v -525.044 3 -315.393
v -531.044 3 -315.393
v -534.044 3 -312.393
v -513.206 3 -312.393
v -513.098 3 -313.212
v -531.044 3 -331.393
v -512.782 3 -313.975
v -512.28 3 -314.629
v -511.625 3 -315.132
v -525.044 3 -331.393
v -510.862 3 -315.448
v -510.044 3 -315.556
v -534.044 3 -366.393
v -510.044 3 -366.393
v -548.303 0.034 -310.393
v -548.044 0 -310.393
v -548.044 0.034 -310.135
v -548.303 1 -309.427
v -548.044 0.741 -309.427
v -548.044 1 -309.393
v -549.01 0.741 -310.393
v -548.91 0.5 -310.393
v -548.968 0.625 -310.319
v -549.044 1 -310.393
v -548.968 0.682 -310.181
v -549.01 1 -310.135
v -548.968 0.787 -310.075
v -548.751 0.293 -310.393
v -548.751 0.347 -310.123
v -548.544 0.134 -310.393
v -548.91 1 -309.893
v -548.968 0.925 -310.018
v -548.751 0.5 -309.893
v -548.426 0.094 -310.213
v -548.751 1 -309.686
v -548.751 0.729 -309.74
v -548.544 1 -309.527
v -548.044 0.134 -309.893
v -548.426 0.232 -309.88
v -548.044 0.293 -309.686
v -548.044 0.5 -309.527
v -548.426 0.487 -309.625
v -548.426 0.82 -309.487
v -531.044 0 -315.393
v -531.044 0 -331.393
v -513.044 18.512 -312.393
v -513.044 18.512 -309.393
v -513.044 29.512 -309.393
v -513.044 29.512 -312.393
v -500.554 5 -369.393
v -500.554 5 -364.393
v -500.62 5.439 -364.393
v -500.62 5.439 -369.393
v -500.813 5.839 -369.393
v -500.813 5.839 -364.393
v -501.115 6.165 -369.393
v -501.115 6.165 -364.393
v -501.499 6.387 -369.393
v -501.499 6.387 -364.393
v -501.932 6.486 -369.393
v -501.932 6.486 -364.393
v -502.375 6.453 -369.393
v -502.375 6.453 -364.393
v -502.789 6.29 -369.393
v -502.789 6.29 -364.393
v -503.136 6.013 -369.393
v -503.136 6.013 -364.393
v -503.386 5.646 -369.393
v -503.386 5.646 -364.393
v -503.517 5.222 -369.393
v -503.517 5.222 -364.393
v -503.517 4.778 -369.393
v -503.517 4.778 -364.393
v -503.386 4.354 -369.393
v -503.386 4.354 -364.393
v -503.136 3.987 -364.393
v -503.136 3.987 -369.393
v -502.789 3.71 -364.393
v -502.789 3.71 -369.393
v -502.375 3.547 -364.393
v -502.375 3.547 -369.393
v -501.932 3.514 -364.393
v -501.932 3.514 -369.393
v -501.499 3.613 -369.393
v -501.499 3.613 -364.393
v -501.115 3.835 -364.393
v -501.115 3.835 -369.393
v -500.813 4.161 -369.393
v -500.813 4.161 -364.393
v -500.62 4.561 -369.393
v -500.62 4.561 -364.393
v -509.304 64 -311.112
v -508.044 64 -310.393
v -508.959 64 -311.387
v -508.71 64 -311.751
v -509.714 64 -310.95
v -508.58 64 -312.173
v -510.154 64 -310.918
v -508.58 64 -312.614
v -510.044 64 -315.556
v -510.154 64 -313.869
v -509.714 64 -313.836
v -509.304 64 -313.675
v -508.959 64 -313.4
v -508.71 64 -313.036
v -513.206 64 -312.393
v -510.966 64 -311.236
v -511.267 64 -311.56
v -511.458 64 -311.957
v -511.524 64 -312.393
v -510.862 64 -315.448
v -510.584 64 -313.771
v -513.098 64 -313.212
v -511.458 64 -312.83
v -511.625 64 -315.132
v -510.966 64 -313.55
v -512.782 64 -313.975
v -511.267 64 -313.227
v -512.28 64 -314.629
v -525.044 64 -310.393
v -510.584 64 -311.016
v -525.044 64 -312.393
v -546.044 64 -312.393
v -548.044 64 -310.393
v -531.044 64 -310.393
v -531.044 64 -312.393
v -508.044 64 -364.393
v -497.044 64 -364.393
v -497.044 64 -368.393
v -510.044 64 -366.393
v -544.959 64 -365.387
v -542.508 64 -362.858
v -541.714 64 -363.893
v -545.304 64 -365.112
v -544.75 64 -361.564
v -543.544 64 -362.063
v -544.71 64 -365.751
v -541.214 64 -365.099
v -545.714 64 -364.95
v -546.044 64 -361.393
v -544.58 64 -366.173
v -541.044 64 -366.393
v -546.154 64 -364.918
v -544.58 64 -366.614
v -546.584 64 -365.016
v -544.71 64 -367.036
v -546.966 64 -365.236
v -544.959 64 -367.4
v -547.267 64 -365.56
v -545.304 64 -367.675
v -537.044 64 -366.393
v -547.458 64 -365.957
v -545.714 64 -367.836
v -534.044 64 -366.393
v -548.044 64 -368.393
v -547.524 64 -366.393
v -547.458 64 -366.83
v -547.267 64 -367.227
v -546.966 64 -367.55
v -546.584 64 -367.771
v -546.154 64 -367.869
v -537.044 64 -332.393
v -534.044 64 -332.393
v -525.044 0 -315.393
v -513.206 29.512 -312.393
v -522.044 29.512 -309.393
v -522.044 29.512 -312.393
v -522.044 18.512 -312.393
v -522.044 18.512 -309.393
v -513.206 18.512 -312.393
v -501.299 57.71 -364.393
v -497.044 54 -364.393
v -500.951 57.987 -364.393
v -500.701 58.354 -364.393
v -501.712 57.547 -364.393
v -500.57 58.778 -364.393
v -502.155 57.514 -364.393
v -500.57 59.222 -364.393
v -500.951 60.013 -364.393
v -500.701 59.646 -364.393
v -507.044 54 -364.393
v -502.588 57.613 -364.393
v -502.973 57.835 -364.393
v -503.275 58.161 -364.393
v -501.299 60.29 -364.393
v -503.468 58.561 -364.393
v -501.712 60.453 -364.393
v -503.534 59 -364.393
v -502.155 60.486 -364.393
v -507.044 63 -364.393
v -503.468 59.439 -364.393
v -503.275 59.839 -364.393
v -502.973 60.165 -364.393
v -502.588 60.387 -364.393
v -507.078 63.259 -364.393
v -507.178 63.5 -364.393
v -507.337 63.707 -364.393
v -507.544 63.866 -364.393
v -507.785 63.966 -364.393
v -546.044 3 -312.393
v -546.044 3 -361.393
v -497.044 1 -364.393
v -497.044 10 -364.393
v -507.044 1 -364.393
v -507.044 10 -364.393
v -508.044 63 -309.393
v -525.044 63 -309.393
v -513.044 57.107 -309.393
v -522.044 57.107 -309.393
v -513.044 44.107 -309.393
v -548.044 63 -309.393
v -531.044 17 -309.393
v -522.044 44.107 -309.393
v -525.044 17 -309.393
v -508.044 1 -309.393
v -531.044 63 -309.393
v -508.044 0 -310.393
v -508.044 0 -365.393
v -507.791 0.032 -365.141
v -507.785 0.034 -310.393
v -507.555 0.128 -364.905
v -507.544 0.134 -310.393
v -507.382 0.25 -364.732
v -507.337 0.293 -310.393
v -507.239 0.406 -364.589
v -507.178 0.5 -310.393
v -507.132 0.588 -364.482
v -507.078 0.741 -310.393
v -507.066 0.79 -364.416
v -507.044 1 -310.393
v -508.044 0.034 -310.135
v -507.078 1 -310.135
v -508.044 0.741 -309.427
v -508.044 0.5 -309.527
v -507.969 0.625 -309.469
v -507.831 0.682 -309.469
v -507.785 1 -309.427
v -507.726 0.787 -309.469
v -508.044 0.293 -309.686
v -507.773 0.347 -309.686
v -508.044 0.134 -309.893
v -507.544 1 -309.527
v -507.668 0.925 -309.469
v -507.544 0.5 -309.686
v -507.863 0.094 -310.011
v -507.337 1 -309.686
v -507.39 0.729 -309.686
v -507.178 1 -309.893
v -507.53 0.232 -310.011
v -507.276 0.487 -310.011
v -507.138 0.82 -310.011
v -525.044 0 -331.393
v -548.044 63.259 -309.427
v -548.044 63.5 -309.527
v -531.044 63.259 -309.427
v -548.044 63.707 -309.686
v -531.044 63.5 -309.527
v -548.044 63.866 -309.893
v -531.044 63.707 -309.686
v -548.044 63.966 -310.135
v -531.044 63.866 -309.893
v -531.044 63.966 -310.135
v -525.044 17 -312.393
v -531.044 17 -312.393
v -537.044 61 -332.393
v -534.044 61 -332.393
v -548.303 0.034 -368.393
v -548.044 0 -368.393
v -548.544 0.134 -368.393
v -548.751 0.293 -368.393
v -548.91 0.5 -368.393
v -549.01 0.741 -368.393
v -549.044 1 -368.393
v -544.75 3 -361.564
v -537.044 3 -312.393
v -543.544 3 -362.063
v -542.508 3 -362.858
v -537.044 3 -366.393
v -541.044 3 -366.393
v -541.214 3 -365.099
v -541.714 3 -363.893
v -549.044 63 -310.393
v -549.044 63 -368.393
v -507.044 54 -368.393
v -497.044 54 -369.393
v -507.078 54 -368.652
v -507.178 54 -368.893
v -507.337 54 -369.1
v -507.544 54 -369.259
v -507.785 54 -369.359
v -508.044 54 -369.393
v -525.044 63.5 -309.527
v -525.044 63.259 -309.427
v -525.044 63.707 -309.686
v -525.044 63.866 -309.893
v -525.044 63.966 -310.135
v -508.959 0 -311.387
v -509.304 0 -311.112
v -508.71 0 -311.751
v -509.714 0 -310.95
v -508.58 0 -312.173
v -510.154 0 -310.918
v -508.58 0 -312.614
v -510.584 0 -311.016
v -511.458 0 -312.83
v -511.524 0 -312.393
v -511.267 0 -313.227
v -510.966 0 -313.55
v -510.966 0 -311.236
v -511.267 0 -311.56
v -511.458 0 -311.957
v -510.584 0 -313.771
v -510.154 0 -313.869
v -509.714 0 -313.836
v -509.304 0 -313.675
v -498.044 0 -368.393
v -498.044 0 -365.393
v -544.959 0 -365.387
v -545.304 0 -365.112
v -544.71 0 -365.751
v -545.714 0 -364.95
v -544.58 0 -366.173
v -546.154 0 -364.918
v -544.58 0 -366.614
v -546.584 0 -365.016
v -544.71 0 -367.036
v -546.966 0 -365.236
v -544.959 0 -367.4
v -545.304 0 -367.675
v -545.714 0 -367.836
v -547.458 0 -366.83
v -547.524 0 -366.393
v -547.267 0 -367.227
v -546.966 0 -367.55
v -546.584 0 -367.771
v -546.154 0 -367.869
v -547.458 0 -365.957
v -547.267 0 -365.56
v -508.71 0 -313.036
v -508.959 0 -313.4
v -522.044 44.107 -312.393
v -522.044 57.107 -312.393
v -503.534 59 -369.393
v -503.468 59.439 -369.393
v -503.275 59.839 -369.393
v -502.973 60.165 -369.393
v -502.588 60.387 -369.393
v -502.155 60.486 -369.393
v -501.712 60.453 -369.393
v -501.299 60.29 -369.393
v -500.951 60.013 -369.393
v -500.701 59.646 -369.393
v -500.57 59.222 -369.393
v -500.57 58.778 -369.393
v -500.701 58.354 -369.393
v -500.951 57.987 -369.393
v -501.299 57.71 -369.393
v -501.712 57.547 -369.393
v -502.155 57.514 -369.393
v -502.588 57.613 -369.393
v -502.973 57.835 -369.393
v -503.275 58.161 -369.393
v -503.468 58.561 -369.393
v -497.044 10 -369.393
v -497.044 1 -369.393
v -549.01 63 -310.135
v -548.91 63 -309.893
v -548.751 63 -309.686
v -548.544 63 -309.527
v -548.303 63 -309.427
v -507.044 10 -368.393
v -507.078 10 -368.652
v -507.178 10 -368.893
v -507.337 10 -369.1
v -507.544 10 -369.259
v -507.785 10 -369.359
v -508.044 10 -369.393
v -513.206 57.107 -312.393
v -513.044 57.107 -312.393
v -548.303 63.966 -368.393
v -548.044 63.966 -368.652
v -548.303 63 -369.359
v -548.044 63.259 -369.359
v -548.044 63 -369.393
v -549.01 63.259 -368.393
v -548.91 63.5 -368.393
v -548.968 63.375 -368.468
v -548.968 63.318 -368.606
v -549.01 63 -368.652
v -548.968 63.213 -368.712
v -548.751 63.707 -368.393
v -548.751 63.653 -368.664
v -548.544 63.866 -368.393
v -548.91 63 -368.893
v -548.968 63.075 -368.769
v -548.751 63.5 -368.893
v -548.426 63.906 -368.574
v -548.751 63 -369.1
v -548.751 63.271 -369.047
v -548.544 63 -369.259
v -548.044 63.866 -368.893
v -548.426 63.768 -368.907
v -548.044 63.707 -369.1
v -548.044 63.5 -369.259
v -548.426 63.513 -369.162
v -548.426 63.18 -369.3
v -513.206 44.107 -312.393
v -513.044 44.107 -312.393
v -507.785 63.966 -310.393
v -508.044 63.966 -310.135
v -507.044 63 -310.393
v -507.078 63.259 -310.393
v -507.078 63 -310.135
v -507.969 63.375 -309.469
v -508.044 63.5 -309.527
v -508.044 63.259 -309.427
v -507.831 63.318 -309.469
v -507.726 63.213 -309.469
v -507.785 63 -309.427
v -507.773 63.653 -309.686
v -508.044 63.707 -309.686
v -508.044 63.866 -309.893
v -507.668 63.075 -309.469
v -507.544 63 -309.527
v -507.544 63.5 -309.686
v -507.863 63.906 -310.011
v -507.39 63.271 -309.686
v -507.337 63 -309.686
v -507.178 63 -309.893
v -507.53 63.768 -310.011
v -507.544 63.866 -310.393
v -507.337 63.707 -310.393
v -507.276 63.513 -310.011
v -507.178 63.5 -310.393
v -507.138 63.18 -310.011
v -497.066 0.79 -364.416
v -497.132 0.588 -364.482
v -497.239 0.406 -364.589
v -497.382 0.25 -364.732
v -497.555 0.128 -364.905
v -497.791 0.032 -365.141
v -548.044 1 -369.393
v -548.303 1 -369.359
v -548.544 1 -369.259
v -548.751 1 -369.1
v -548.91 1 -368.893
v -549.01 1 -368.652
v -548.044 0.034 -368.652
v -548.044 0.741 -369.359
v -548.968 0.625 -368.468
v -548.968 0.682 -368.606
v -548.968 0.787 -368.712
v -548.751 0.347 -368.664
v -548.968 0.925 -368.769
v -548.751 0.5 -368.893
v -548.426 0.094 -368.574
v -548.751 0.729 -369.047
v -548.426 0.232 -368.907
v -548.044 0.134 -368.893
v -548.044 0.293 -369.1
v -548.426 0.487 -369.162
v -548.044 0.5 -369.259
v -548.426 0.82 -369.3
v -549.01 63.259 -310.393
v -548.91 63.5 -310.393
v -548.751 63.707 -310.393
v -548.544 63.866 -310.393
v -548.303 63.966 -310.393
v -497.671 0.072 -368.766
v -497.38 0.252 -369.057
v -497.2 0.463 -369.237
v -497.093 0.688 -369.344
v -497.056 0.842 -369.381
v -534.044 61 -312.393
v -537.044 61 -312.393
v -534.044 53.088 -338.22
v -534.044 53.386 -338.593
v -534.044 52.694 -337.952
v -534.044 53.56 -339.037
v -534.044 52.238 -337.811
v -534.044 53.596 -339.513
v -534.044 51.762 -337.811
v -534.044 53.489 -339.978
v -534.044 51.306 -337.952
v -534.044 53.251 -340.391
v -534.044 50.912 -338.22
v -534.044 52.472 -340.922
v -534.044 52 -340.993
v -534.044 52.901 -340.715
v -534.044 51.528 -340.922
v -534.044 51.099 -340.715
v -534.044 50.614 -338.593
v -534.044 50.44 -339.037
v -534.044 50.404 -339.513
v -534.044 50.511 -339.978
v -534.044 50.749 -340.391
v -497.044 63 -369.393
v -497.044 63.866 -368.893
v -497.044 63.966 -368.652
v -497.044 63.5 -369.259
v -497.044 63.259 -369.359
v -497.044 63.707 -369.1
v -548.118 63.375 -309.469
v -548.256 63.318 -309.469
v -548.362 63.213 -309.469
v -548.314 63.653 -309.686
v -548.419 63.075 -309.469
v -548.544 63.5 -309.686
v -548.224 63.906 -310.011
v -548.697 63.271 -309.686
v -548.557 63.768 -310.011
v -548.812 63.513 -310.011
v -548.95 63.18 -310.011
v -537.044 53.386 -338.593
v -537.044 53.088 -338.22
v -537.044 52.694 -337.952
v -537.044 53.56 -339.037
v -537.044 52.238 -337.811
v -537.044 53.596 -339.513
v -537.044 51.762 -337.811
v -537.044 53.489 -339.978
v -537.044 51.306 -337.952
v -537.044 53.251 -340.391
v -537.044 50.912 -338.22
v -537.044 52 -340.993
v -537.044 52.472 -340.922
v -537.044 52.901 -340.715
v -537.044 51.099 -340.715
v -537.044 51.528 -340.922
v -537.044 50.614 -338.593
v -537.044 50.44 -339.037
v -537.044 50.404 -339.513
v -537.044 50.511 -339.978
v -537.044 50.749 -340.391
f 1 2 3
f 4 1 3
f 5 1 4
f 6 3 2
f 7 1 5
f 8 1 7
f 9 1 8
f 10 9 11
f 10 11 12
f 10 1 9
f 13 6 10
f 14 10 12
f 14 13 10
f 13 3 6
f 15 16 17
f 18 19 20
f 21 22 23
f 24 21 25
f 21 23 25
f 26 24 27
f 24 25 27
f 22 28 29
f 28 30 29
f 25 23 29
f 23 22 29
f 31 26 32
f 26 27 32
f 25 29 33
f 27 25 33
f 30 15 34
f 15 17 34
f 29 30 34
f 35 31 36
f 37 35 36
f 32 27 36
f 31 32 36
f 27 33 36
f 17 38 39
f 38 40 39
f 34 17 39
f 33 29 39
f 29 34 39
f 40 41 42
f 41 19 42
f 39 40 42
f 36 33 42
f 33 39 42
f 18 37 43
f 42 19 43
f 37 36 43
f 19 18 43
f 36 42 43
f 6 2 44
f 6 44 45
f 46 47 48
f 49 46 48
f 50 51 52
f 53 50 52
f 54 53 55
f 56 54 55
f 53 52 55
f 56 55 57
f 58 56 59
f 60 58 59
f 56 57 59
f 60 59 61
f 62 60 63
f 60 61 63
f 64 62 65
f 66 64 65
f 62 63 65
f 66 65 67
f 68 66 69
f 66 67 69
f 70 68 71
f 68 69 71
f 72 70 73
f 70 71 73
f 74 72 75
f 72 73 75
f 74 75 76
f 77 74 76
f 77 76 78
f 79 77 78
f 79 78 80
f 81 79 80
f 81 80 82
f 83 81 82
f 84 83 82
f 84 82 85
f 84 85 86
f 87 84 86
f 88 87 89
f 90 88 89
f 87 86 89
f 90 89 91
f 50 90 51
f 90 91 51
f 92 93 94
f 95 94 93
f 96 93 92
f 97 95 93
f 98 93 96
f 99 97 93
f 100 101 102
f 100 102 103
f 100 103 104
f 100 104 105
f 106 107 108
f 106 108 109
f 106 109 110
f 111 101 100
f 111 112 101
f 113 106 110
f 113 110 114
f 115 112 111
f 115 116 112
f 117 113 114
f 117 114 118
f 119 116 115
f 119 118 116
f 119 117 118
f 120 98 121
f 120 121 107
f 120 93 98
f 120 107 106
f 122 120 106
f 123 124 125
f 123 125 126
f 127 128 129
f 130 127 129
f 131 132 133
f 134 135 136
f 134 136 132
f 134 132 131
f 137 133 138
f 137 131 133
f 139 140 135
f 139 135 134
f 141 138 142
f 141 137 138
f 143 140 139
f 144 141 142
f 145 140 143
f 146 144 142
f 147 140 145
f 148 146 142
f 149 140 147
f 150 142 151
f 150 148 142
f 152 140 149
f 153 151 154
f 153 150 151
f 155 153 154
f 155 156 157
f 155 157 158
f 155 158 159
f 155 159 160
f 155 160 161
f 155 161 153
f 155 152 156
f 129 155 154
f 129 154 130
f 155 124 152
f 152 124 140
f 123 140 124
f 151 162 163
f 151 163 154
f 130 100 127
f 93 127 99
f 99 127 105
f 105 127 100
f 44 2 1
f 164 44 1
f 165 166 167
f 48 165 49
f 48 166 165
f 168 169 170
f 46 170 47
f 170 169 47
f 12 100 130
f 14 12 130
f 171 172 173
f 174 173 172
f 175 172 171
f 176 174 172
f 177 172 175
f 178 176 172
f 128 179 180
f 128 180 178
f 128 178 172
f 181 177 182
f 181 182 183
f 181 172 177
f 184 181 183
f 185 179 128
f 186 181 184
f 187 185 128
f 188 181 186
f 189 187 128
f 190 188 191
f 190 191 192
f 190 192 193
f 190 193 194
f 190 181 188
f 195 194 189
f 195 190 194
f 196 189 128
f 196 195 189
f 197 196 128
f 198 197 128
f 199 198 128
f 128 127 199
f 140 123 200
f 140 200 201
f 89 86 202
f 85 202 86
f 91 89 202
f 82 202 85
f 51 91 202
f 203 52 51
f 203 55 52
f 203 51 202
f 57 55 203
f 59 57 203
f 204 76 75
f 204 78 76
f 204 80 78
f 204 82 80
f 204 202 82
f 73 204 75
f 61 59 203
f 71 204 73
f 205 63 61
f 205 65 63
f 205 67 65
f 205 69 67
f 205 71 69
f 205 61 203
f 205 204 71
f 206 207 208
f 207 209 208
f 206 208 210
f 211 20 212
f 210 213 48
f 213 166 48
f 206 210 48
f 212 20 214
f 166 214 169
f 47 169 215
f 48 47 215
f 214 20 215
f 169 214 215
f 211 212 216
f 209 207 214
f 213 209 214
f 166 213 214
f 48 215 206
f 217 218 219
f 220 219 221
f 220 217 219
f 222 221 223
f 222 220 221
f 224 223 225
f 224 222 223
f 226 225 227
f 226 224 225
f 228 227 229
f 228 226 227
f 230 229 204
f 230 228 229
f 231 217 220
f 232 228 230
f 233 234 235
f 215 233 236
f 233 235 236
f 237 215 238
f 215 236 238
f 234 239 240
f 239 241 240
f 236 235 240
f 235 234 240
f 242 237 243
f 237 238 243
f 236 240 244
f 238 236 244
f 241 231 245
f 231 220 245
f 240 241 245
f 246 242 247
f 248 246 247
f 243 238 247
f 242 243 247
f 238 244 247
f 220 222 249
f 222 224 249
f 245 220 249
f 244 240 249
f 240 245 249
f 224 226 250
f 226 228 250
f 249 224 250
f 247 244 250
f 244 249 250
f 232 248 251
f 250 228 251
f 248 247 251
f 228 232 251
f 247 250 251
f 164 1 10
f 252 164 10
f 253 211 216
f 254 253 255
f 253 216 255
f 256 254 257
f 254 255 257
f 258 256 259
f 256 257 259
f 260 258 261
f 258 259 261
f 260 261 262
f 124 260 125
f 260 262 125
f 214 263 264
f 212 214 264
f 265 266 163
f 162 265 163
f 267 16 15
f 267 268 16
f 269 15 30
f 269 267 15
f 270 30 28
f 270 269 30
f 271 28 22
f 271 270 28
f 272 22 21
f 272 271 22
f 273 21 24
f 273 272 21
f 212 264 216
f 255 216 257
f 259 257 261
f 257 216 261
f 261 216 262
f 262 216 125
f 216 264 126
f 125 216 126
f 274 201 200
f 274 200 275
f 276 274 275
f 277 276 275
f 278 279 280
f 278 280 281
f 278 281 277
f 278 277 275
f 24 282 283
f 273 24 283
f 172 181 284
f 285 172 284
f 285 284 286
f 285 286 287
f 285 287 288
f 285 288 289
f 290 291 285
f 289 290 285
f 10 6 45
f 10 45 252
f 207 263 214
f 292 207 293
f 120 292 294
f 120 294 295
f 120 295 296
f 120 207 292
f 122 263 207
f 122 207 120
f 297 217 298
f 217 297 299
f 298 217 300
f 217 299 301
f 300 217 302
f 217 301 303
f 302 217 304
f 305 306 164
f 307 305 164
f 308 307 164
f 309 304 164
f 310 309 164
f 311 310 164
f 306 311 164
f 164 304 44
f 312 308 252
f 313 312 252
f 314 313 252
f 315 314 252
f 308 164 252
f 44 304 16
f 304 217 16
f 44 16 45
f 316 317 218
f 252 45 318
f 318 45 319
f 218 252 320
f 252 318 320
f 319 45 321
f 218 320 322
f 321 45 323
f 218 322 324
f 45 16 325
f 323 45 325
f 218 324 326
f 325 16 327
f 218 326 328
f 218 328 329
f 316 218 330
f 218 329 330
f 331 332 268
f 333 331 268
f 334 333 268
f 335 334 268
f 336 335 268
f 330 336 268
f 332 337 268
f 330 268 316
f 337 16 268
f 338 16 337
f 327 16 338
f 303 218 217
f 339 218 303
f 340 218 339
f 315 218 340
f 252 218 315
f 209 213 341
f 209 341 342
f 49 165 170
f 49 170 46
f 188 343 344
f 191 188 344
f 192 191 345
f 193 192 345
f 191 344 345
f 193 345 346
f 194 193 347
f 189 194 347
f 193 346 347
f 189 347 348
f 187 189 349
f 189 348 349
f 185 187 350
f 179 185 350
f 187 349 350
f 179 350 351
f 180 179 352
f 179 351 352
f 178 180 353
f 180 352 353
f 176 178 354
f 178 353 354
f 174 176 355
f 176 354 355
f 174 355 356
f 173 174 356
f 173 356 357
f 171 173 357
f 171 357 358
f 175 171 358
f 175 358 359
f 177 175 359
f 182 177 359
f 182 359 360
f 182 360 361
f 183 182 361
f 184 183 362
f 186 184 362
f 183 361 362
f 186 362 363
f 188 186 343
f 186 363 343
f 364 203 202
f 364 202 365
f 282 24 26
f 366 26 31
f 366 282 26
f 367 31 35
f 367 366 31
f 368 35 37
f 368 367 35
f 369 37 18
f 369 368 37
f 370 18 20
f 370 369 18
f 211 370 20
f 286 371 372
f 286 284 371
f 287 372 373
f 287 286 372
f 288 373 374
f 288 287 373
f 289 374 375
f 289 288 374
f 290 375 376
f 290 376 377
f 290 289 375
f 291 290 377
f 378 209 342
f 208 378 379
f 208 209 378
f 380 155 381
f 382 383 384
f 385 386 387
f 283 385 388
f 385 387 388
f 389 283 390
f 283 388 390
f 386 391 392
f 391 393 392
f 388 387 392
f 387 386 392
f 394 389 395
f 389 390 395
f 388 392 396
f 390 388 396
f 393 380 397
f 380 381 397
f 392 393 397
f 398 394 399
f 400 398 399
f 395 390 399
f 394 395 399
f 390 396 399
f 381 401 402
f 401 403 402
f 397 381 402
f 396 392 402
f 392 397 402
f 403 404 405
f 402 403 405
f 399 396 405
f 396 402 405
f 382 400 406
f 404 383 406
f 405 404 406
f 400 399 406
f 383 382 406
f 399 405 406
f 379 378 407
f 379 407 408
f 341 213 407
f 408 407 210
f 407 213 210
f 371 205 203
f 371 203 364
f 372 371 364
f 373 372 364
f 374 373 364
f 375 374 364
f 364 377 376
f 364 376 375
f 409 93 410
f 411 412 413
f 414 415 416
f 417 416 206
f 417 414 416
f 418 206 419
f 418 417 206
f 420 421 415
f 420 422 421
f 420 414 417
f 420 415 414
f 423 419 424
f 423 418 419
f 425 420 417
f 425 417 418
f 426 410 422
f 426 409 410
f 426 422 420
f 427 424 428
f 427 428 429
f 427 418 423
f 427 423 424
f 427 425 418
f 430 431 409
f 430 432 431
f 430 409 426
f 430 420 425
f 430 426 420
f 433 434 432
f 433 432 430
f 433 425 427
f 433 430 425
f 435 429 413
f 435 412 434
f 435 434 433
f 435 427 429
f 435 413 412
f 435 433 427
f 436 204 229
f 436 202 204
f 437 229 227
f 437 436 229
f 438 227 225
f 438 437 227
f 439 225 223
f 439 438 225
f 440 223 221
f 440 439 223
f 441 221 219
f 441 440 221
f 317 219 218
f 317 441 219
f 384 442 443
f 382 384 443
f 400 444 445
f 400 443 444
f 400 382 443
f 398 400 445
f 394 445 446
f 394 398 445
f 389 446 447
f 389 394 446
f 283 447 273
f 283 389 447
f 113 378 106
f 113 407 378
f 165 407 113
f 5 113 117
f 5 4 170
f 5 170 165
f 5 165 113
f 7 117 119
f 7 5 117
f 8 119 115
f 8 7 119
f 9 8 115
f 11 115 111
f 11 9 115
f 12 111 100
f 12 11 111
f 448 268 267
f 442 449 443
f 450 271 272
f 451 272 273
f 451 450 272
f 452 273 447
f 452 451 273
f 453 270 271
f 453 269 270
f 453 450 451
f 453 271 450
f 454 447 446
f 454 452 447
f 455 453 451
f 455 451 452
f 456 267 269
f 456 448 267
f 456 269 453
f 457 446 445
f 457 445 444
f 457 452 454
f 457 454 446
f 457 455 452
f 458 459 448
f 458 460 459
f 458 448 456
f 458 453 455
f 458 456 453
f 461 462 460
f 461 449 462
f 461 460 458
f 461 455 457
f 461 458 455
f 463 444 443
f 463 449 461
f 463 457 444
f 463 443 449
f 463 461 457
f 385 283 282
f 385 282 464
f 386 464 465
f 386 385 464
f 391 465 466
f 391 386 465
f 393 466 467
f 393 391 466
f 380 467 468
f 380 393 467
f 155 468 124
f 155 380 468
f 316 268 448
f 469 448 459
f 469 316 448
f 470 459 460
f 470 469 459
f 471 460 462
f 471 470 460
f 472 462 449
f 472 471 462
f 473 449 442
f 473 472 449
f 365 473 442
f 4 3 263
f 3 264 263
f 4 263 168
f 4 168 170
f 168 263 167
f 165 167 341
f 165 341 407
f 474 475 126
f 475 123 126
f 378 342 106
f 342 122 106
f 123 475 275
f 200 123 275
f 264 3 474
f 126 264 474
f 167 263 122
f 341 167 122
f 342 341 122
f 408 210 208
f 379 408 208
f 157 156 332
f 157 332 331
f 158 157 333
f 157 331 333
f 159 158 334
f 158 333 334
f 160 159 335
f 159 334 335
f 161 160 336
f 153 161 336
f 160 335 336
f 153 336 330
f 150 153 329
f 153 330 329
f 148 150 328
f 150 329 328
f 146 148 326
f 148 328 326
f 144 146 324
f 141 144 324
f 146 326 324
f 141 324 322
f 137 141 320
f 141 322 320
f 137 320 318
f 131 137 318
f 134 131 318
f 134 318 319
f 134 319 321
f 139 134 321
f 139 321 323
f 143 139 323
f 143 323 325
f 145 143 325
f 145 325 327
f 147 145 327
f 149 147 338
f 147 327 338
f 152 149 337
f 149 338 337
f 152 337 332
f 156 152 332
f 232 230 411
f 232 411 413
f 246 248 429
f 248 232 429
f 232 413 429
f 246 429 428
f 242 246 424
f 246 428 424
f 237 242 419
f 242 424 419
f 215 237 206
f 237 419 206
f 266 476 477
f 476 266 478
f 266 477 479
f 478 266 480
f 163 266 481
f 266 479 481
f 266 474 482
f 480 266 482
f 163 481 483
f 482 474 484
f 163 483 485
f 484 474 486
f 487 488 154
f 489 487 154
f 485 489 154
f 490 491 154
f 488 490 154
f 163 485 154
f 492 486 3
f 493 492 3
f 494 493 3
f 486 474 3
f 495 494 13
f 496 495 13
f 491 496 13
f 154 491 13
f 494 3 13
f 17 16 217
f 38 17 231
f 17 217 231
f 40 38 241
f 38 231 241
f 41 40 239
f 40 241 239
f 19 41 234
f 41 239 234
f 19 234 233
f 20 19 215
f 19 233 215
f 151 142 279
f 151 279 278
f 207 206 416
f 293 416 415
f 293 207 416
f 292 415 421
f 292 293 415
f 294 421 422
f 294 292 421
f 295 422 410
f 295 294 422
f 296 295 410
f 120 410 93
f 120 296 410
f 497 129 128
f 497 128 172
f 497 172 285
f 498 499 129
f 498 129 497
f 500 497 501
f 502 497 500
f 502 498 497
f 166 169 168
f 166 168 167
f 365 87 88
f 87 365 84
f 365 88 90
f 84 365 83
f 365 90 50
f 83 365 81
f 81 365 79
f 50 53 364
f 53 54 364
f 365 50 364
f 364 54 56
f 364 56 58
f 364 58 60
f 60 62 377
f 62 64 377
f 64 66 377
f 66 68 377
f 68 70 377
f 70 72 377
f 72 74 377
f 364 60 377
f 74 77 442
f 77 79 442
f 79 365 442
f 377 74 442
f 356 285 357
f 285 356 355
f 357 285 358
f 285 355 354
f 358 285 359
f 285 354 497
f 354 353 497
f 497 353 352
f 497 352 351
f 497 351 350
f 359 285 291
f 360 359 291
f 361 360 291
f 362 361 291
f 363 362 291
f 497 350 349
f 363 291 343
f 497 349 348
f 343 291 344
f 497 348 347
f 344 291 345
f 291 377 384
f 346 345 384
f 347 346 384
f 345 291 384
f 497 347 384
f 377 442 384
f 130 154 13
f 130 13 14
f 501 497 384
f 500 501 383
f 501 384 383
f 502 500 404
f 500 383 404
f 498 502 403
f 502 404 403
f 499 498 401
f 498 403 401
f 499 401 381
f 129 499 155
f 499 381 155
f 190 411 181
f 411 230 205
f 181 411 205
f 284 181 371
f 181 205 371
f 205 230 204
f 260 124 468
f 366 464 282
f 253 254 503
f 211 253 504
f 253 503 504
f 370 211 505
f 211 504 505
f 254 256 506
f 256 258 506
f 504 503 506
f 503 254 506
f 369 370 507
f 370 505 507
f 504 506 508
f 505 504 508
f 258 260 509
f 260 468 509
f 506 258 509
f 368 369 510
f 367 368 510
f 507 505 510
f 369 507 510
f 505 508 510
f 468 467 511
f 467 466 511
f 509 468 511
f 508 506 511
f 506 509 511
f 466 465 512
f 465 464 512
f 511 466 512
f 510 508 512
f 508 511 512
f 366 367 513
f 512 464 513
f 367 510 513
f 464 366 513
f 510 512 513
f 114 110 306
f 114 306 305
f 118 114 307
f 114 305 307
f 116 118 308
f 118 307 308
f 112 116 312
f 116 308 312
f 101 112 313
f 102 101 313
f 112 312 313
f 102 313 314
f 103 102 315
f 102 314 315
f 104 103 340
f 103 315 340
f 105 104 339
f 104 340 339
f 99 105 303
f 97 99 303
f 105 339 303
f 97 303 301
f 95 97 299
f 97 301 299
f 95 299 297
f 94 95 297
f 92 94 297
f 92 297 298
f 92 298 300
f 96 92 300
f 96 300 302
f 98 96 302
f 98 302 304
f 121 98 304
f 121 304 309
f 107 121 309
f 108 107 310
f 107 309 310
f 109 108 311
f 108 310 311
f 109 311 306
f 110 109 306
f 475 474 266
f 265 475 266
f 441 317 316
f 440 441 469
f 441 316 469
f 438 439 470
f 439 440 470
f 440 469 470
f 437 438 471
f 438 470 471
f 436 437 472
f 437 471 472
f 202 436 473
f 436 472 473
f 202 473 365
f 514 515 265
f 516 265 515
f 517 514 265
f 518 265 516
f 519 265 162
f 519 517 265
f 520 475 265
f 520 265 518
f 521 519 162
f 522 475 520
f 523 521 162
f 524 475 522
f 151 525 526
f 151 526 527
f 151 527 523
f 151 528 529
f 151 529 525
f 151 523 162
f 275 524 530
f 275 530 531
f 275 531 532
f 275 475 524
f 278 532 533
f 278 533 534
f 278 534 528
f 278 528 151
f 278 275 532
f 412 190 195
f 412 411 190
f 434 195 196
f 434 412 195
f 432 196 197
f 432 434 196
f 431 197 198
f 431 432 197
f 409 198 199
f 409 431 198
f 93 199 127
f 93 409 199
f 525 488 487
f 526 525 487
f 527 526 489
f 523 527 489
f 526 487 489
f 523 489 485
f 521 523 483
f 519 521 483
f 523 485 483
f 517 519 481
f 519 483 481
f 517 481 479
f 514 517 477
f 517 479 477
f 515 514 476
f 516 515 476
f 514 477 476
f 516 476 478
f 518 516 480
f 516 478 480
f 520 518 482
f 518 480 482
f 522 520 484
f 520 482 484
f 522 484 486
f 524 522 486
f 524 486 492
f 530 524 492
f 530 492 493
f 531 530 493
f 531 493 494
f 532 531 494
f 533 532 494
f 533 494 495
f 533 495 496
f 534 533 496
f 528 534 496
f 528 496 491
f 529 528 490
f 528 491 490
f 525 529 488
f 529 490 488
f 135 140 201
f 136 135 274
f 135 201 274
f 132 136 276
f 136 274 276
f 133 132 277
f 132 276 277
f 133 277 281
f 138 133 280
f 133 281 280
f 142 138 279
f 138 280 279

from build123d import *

# Parameters (mm, degrees)
SKETCH1_W           = 42
SKETCH1_H           = 60
BOSS_EXTRUDE1_DEPTH = 64
SKETCH2_W           = 36
SKETCH2_H           = 54
CUT_EXTRUDE1_DEPTH  = 61
SKETCH5_W           = 3
SKETCH5_H           = 54
BOSS_EXTRUDE2_DEPTH = 61
SKETCH6_W           = 6
SKETCH6_H           = 47
CUT_EXTRUDE3_DEPTH  = 3
SKETCH7_W           = 6
SKETCH7_H           = 16
CUT_EXTRUDE4_DEPTH  = 3
BOSS_EXTRUDE3_DEPTH = 64
SKETCH10_R          = 1.48
CUT_EXTRUDE6_DEPTH  = 64
BOSS_EXTRUDE4_DEPTH = 64
SKETCH12_R          = 1.48
CUT_EXTRUDE7_DEPTH  = 64
SKETCH13_W          = 5
SKETCH13_H          = 10
BOSS_EXTRUDE5_DEPTH = 10
SKETCH14_R          = 1.49
CUT_EXTRUDE8_DEPTH  = 5
SKETCH15_W          = 5
SKETCH15_H          = 10
BOSS_EXTRUDE6_DEPTH = 10
SKETCH16_R          = 1.49
CUT_EXTRUDE9_DEPTH  = 5
SKETCH17_R          = 1.6
CUT_EXTRUDE10_DEPTH = 3
FILLET1_R           = 1
SKETCH21_W          = 9
SKETCH21_H          = 13
SKETCH21_H_2        = 11
CUT_EXTRUDE11_DEPTH = 3
SKETCH23_W          = 20
SKETCH23_H          = 3
CUT_EXTRUDE12_DEPTH = 3


with BuildPart() as part:
    # Sketch1 → Boss-Extrude1 (new body)
    with BuildSketch(Plane(origin=(0, 0, 0), x_dir=(1, 0, 0), z_dir=(0, 1, 0))):
        with Locations((-528.043708609, 339.393377483)):
            Rectangle(SKETCH1_W, SKETCH1_H)
    extrude(amount=BOSS_EXTRUDE1_DEPTH)

    # Sketch2 → Cut-Extrude1 (cut)
    with BuildSketch(Plane(origin=(0, 64, 0), x_dir=(1, 0, 0), z_dir=(0, 1, 0))):
        with Locations((-528.043708609, 339.393377483)):
            Rectangle(SKETCH2_W, SKETCH2_H)
    extrude(amount=-CUT_EXTRUDE1_DEPTH, mode=Mode.SUBTRACT)

    # Sketch5 → Boss-Extrude2 (add)
    with BuildSketch(Plane(origin=(0, 3, 0), x_dir=(1, 0, 0), z_dir=(0, 1, 0))):
        with Locations((-535.543708609, 339.393377483)):
            Rectangle(SKETCH5_W, SKETCH5_H)
    extrude(amount=BOSS_EXTRUDE2_DEPTH)

    # Sketch6 → Cut-Extrude3 (cut)
    with BuildSketch(Plane(origin=(0, 0, -312.393377483), x_dir=(-1, 0, 0), z_dir=(0, 0, -1))):
        with Locations((528.043708609, 40.5)):
            Rectangle(SKETCH6_W, SKETCH6_H)
    extrude(amount=-CUT_EXTRUDE3_DEPTH, mode=Mode.SUBTRACT)

    # Sketch7 → Cut-Extrude4 (cut)
    with BuildSketch(Plane(origin=(0, 3, 0), x_dir=(1, 0, 0), z_dir=(0, 1, 0))):
        with Locations((-528.043708609, 323.393377483)):
            Rectangle(SKETCH7_W, SKETCH7_H)
    extrude(amount=-CUT_EXTRUDE4_DEPTH, mode=Mode.SUBTRACT)

    # Sketch9 → Boss-Extrude3 (add)
    with BuildSketch(Plane.XZ):
        with BuildLine():
            Line((-507.043708609, -313.393377483), (-507.043708609, -309.393377483))
            Line((-507.043708609, -309.393377483), (-511.043708609, -309.393377483))
            ThreePointArc((-511.043708609, -309.393377483), (-512.279776587, -314.629445461), (-507.043708609, -313.393377483))
        make_face()
    extrude(amount=-BOSS_EXTRUDE3_DEPTH)

    # Sketch10 → Cut-Extrude6 (cut)
    with BuildSketch(Plane(origin=(0, 0, 0), x_dir=(-1, 0, 0), z_dir=(0, -1, 0))):
        with Locations((510.043708609, 312.393377483)):
            Circle(SKETCH10_R)
    extrude(amount=-CUT_EXTRUDE6_DEPTH, mode=Mode.SUBTRACT)

    # Sketch11 → Boss-Extrude4 (add)
    with BuildSketch(Plane.XZ):
        with BuildLine():
            Line((-542.043708609, -369.393377483), (-549.043708609, -369.393377483))
            Line((-549.043708609, -369.393377483), (-549.043708609, -362.393377483))
            ThreePointArc((-549.043708609, -362.393377483), (-542.508174703, -362.857843578), (-542.043708609, -369.393377483))
        make_face()
    extrude(amount=-BOSS_EXTRUDE4_DEPTH)

    # Sketch12 → Cut-Extrude7 (cut)
    with BuildSketch(Plane(origin=(0, 0, 0), x_dir=(-1, 0, 0), z_dir=(0, -1, 0))):
        with Locations((546.043708609, 366.393377483)):
            Circle(SKETCH12_R)
    extrude(amount=-CUT_EXTRUDE7_DEPTH, mode=Mode.SUBTRACT)

    # Sketch13 → Boss-Extrude5 (add)
    with BuildSketch(Plane(origin=(-507.043708609, 0, 0), x_dir=(0, 0, -1), z_dir=(1, 0, 0))):
        with Locations((366.893377483, 59)):
            Rectangle(SKETCH13_W, SKETCH13_H)
    extrude(amount=BOSS_EXTRUDE5_DEPTH)

    # Sketch14 → Cut-Extrude8 (cut)
    with BuildSketch(Plane(origin=(0, 0, -369.393377483), x_dir=(-1, 0, 0), z_dir=(0, 0, -1))):
        with Locations((502.043708609, 59)):
            Circle(SKETCH14_R)
    extrude(amount=-CUT_EXTRUDE8_DEPTH, mode=Mode.SUBTRACT)

    # Sketch15 → Boss-Extrude6 (add)
    with BuildSketch(Plane(origin=(-507.043708609, 0, 0), x_dir=(0, 0, -1), z_dir=(1, 0, 0))):
        with Locations((366.893377483, 5)):
            Rectangle(SKETCH15_W, SKETCH15_H)
    extrude(amount=BOSS_EXTRUDE6_DEPTH)

    # Sketch16 → Cut-Extrude9 (cut)
    with BuildSketch(Plane.XY.offset(-364.393377483)):
        with Locations((-502.043708609, 5)):
            Circle(SKETCH16_R)
    extrude(amount=-CUT_EXTRUDE9_DEPTH, mode=Mode.SUBTRACT)

    # Sketch17 → Cut-Extrude10 (cut)
    with BuildSketch(Plane(origin=(-534.043708609, 0, 0), x_dir=(0, 0, -1), z_dir=(1, 0, 0))):
        with Locations((339.393377483, 52)):
            Circle(SKETCH17_R)
    extrude(amount=-CUT_EXTRUDE10_DEPTH, mode=Mode.SUBTRACT)

    # Fillet1
    fillet1_edges = [part.edges().sort_by_distance(p)[0] for p in [
        (-507.043708609, 64, -336.893377483),
        (-507.043708609, 32, -369.393377483),
        (-523.043708609, 64, -369.393377483),
        (-502.043708609, 0, -364.393377483),
        (-497.043708609, 0, -366.893377483),
        (-549.043708609, 64, -339.393377483),
        (-516.043708609, 64, -309.393377483),
        (-523.043708609, 0, -369.393377483),
        (-507.043708609, 0, -336.893377483),
        (-528.043708609, 0, -309.393377483),
        (-549.043708609, 0, -339.393377483),
        (-540.043708609, 64, -309.393377483),
        (-549.043708609, 32, -369.393377483),
        (-507.043708609, 32, -309.393377483),
        (-549.043708609, 32, -309.393377483),
    ]]
    fillet(fillet1_edges, radius=FILLET1_R)

    # Sketch21 → Cut-Extrude11 (cut)
    with BuildSketch(Plane.XY.offset(-309.393377483)):
        with Locations((-517.543708609, 50.606602204)):
            Rectangle(SKETCH21_W, SKETCH21_H)
        with Locations((-517.543708609, 24.011624804)):
            Rectangle(SKETCH21_W, SKETCH21_H_2)
    extrude(amount=-CUT_EXTRUDE11_DEPTH, mode=Mode.SUBTRACT)

    # Sketch23 → Cut-Extrude12 (cut)
    with BuildSketch(Plane(origin=(-534.043708609, 0, 0), x_dir=(0, 0, -1), z_dir=(1, 0, 0))):
        with Locations((322.393377483, 62.5)):
            Rectangle(SKETCH23_W, SKETCH23_H)
    extrude(amount=-CUT_EXTRUDE12_DEPTH, mode=Mode.SUBTRACT)


solid = part.part
